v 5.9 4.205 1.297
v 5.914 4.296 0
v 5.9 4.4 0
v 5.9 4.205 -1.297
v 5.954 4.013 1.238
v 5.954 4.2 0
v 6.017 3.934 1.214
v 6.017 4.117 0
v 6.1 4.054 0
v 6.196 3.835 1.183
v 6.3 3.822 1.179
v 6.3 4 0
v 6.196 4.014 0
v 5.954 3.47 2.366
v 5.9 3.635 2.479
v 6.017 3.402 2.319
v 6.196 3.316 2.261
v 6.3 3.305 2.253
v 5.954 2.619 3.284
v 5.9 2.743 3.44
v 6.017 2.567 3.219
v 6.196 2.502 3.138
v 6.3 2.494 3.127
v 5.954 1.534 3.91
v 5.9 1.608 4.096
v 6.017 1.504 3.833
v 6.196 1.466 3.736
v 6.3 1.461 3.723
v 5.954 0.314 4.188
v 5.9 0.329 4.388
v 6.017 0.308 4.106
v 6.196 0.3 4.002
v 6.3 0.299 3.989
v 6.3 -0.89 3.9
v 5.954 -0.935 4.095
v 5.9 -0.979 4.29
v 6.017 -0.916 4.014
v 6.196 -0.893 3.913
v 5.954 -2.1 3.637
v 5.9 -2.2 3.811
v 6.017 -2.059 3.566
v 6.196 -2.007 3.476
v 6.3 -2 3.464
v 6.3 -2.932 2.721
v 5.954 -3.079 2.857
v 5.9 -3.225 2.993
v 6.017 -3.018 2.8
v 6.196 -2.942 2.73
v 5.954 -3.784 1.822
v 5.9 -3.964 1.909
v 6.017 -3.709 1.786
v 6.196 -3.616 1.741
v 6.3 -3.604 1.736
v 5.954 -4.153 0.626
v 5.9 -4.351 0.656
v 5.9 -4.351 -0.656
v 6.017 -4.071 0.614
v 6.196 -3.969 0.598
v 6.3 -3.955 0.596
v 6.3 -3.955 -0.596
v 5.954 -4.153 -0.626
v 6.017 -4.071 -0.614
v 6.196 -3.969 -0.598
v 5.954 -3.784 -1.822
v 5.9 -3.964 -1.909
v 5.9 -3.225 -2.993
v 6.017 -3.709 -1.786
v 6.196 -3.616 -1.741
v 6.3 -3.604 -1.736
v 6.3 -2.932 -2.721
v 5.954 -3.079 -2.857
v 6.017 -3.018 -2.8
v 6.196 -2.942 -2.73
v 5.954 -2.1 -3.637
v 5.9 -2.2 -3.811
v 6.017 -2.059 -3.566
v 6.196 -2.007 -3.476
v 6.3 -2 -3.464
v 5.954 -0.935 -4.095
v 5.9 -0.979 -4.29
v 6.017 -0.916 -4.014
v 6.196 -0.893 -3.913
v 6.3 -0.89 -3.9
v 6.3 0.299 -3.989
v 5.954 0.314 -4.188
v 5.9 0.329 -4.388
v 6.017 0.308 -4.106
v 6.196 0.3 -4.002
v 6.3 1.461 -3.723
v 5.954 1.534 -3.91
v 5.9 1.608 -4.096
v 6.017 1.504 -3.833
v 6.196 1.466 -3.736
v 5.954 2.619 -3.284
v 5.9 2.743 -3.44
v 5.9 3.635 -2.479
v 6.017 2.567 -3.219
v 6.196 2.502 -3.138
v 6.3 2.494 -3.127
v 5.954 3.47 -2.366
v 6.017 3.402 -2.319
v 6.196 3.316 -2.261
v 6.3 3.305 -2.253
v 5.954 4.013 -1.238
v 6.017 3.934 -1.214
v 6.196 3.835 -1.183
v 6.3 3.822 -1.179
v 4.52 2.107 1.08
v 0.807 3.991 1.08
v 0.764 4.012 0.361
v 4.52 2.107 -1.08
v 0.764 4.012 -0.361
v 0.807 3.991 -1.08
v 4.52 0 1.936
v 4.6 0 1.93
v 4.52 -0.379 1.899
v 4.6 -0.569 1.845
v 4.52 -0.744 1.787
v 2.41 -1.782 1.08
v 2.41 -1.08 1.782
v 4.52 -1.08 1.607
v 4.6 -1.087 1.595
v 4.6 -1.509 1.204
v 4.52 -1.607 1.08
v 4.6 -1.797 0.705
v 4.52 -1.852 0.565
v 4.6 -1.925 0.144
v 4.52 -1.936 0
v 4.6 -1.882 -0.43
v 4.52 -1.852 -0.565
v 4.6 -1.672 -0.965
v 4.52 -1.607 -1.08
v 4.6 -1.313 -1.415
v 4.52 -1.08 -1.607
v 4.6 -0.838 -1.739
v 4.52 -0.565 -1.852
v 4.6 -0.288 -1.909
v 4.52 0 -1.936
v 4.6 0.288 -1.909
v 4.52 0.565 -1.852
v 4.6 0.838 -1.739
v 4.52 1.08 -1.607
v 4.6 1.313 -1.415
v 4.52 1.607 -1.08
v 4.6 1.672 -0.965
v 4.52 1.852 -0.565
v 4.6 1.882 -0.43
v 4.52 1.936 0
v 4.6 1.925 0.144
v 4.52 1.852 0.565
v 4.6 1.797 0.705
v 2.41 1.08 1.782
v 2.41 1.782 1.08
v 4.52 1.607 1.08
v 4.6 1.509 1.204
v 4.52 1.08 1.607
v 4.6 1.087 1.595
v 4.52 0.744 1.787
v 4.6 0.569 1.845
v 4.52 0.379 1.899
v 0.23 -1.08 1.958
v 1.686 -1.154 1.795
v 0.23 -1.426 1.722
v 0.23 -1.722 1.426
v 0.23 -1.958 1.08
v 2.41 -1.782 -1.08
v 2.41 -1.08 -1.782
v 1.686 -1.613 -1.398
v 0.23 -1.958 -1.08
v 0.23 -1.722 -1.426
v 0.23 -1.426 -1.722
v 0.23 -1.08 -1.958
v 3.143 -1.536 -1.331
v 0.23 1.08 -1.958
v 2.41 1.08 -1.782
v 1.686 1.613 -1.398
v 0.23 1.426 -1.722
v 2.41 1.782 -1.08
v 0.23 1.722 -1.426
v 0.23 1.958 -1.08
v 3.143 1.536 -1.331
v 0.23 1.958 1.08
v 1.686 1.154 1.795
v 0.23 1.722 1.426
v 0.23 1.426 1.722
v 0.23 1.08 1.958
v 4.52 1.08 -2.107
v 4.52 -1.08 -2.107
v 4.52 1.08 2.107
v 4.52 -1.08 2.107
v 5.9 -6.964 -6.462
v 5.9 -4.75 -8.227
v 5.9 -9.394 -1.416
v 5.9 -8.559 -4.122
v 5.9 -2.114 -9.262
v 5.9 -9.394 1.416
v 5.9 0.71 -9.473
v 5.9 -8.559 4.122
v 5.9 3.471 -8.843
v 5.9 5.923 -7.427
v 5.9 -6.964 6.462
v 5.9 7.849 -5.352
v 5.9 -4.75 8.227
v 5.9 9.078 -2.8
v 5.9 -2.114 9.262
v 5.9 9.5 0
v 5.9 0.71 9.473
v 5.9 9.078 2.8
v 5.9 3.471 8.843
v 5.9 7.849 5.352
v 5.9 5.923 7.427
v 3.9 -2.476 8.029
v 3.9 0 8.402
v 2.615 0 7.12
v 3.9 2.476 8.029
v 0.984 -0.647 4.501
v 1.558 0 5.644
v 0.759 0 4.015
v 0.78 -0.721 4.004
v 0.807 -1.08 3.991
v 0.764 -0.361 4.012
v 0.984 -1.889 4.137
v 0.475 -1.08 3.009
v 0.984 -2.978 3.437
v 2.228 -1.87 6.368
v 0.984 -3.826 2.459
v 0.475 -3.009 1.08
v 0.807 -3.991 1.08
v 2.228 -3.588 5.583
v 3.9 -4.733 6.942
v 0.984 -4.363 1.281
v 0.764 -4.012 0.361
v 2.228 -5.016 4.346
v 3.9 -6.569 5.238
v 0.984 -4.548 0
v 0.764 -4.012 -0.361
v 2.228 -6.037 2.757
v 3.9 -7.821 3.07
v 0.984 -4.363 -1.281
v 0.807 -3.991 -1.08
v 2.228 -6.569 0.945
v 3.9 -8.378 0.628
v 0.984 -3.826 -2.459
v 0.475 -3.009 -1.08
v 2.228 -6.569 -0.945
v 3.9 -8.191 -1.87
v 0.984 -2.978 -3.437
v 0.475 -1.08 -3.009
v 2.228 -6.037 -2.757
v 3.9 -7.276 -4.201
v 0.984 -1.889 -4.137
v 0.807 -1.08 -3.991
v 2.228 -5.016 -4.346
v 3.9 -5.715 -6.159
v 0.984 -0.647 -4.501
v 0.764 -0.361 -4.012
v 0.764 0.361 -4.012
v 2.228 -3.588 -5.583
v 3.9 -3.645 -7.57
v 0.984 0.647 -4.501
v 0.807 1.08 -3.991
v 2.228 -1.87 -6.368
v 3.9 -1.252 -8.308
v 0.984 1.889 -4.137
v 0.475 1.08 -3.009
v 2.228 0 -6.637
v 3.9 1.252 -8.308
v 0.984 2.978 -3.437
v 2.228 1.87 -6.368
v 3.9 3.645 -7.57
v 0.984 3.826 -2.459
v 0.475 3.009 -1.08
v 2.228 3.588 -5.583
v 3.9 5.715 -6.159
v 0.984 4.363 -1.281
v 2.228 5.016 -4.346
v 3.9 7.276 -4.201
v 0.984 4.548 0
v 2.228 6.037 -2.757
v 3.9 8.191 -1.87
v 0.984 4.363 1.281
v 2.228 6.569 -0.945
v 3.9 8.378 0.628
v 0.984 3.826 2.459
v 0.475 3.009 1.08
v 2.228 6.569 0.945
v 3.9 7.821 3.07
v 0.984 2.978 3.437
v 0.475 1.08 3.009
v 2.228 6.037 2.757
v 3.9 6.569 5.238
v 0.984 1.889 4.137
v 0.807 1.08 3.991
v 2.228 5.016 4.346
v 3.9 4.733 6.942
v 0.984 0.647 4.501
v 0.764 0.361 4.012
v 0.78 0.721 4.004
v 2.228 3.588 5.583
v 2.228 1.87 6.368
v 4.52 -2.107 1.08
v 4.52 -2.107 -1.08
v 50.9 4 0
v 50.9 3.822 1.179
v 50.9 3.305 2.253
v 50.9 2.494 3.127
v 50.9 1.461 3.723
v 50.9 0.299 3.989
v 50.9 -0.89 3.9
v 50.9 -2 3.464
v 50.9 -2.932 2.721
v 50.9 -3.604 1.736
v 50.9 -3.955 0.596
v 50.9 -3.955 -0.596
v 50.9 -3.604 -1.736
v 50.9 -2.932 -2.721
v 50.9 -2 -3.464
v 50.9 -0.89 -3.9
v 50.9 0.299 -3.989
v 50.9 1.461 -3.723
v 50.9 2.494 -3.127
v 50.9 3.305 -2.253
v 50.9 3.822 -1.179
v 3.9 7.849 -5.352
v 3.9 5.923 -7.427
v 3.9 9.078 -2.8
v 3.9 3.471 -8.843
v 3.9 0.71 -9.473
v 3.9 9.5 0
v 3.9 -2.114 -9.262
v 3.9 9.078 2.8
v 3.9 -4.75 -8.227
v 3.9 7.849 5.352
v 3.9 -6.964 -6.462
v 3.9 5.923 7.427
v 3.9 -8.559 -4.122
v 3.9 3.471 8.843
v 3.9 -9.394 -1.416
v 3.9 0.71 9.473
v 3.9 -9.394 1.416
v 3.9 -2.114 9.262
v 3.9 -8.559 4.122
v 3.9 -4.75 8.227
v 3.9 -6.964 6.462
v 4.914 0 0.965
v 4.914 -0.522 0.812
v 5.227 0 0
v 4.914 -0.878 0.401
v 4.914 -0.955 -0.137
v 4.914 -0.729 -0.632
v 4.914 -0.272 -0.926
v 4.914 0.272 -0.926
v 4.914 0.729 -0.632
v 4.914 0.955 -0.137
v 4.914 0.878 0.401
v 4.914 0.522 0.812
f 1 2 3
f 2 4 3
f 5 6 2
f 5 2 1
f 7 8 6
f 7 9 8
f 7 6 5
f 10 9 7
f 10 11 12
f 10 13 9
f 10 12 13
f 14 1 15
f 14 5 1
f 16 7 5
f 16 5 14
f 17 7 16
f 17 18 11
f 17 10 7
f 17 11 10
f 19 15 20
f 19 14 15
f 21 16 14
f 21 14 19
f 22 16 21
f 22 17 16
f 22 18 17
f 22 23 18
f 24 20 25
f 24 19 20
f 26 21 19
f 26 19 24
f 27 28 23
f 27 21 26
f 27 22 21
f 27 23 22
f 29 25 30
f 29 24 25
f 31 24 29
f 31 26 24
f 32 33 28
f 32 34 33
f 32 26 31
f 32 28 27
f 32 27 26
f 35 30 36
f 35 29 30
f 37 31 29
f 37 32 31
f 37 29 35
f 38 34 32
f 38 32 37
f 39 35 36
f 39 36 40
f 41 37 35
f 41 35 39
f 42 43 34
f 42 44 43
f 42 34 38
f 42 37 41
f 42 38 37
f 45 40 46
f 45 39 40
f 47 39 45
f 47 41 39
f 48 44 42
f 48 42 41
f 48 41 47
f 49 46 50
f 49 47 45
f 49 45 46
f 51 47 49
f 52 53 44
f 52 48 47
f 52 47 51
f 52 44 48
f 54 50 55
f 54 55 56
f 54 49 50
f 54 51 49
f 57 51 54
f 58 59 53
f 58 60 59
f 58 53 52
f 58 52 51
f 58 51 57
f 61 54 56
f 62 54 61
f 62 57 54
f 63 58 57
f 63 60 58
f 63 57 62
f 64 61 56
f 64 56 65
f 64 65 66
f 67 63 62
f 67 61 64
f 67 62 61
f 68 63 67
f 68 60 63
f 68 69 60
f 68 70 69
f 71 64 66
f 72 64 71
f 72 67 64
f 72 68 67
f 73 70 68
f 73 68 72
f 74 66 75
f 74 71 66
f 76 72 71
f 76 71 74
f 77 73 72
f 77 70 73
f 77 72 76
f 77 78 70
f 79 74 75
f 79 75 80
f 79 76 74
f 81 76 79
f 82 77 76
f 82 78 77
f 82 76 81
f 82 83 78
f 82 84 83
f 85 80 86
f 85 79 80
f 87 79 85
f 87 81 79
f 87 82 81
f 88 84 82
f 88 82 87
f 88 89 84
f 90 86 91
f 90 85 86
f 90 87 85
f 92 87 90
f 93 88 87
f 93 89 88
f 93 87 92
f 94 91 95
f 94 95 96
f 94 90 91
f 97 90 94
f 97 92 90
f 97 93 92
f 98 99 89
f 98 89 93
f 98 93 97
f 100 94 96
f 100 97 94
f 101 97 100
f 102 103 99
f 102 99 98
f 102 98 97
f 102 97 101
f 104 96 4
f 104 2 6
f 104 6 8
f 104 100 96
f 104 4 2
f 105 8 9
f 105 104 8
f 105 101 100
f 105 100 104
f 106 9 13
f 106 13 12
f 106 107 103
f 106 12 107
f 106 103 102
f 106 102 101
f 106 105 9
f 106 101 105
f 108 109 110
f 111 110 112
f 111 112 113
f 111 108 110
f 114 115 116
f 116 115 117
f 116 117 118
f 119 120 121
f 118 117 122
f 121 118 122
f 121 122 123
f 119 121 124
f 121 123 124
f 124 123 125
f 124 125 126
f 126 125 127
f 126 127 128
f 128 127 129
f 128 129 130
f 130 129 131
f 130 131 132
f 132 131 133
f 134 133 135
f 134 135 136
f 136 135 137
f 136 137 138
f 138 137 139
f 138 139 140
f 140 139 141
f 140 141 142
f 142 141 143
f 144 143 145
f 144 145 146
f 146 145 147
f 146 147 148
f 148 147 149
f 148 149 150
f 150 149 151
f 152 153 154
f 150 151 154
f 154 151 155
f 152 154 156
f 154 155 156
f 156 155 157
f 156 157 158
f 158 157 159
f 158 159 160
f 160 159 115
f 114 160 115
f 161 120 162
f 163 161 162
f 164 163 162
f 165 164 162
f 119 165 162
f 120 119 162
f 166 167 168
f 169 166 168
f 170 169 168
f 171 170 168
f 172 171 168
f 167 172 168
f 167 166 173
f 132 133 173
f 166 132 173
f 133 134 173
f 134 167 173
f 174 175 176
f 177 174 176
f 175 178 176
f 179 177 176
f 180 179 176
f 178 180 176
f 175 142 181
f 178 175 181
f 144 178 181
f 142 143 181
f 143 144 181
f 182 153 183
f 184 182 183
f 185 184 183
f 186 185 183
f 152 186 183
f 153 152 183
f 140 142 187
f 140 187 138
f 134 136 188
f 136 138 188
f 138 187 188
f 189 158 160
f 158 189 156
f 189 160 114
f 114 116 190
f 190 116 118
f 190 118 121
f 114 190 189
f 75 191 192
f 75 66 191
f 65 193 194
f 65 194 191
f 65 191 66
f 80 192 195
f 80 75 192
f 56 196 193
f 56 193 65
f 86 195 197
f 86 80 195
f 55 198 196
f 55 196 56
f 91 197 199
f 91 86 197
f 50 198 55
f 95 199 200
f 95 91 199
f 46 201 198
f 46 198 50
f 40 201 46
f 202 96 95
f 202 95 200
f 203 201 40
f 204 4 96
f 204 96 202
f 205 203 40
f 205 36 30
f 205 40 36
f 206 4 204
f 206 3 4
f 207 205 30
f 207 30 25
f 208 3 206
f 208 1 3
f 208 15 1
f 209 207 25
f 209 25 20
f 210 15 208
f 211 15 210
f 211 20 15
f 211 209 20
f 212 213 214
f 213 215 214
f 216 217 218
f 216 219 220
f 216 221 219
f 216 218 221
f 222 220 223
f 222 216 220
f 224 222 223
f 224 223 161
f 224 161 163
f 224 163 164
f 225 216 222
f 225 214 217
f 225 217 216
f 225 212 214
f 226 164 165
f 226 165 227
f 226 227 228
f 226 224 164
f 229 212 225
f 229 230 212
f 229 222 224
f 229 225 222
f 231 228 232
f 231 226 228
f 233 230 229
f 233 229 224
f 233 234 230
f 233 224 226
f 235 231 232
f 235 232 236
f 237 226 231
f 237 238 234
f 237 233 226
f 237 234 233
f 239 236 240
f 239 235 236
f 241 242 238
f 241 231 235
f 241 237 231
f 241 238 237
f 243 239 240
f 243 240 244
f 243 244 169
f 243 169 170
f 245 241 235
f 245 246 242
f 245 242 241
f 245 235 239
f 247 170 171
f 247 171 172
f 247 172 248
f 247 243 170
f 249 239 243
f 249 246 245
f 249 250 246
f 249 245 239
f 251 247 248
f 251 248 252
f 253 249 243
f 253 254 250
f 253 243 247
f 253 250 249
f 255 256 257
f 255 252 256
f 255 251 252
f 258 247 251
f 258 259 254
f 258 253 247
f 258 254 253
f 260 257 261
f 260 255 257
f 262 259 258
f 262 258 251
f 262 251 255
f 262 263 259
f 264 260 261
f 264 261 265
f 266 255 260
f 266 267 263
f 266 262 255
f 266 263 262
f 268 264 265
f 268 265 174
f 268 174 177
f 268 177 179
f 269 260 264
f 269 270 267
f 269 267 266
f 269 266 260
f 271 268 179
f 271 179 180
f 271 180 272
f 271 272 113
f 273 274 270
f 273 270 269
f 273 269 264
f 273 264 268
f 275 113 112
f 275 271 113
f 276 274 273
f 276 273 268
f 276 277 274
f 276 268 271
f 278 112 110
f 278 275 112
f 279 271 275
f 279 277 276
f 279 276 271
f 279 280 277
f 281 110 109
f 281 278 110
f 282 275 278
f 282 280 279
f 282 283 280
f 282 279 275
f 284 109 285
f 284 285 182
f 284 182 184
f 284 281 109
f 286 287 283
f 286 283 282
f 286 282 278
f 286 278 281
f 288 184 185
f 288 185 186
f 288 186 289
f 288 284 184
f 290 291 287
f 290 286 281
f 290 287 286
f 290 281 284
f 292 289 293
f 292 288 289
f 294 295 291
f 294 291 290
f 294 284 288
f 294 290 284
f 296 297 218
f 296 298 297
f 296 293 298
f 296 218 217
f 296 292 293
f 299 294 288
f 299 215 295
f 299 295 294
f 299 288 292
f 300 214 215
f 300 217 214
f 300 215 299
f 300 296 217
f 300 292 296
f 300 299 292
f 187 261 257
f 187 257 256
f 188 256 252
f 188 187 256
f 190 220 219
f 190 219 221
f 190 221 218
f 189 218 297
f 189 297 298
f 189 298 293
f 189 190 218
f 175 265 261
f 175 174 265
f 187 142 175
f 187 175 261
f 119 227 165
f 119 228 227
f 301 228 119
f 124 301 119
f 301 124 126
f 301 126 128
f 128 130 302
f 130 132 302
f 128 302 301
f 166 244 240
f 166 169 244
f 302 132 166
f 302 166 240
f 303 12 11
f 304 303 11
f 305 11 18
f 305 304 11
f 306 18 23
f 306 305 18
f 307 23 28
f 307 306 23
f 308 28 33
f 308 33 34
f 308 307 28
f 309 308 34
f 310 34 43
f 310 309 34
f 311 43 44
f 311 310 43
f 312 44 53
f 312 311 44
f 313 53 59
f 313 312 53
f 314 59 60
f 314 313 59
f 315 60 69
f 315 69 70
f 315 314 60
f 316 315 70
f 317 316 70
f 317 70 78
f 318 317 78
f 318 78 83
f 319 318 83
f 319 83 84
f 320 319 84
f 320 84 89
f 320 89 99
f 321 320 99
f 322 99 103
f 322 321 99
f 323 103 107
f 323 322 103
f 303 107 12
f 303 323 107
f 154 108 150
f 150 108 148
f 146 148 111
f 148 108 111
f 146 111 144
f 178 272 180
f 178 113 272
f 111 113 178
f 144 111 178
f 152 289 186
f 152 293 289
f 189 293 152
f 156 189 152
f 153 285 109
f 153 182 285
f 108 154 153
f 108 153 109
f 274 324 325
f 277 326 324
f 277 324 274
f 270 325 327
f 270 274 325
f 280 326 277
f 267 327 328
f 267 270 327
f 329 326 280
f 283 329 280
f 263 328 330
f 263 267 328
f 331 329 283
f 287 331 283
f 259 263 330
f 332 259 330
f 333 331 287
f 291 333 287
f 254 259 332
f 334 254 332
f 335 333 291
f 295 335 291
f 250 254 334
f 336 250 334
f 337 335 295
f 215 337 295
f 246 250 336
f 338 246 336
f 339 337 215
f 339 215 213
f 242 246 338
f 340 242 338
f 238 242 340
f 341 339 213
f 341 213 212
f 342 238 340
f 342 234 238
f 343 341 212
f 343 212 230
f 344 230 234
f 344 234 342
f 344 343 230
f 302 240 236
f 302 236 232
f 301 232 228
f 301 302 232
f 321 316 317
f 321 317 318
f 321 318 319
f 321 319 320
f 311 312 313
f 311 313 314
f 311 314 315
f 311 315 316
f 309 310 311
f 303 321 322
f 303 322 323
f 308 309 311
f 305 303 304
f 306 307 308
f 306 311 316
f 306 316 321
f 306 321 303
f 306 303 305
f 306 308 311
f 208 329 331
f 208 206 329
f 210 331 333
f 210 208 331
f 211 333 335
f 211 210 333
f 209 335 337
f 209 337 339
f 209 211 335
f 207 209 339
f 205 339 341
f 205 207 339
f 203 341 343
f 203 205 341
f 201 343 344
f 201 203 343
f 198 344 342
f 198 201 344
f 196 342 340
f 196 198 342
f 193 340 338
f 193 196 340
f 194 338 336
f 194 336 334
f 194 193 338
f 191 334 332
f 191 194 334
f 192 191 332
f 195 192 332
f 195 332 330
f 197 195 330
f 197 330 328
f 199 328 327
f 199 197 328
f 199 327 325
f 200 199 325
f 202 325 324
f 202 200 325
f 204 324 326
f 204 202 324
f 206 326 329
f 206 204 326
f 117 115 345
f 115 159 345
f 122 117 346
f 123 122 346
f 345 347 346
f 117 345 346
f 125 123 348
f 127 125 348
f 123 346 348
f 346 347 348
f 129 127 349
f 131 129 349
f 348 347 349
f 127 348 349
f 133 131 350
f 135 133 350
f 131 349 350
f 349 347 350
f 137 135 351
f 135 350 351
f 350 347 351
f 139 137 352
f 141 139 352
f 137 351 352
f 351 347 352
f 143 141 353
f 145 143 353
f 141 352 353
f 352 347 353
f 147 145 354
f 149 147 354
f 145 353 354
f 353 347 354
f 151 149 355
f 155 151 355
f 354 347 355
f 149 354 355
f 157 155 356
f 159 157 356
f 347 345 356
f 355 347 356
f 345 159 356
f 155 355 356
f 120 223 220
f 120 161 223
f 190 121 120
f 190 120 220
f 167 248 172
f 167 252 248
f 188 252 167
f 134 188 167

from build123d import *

# Parameters (mm, degrees)
FILLET1_R    = 0.4
RECPAT_COUNT = 2
RECPAT_ANGLE = 90


with BuildPart() as part:
    # BodySke → Base-Revolve (revolve)
    with BuildSketch(Plane.XY):
        Polygon((5.9, 4), (5.9, 9.5), (3.9, 9.5), (3.9, 0), (50.9, 0), (50.9, 4), align=None)
    revolve(axis=Axis((-6.35, 0, 0), (1, 0, 0)))

    # Fillet1
    fillet1_edges = [part.edges().sort_by_distance(p)[0] for p in [
        (5.9, -4, 0),
    ]]
    fillet(fillet1_edges, radius=FILLET1_R)

    # PanSke → Pan (revolve)
    with BuildSketch(Plane.XY):
        with BuildLine():
            Line((3.9, 8.401785525), (3.9, 0))
            Line((3.9, 0), (0, 0))
            ThreePointArc((0, 0), (1.02252537, 4.631414471), (3.9, 8.401785525))
        make_face()
    revolve(axis=Axis((0, 0, 0), (1, 0, 0)))

    # Sketch3 → Recess section 0
    with BuildSketch(Plane(origin=(0, 0, 0), x_dir=(0, 0, -1), z_dir=(1, 0, 0))):
        with BuildLine():
            Line((-1.08, 4.4), (1.08, 4.4))
            Line((1.08, 4.4), (1.08, -4.4))
            Line((1.08, -4.4), (-1.08, -4.4))
            Line((-1.08, -4.4), (-1.08, 4.4))
        make_face()
    # Sketch4 → Recess section 1
    with BuildSketch(Plane(origin=(4.52, 0, 0), x_dir=(0, 0, -1), z_dir=(1, 0, 0))):
        with BuildLine():
            Line((-1.08, 2.106524682), (1.08, 2.106524682))
            Line((1.08, 2.106524682), (1.08, -2.106524682))
            Line((1.08, -2.106524682), (-1.08, -2.106524682))
            Line((-1.08, -2.106524682), (-1.08, 2.106524682))
        make_face()
    recess = loft(mode=Mode.SUBTRACT)

    # RecPat: Recess ×2 about axis
    recpat_axis = Axis((0, 0, 0), (1, 0, 0))
    for i in range(1, RECPAT_COUNT):
        add(recess.rotate(recpat_axis, i * RECPAT_ANGLE / (RECPAT_COUNT - 1)), mode=Mode.SUBTRACT)

    # RecCorSke → RecessCore (revolve, cut)
    with BuildSketch(Plane.XY):
        Polygon((0, 0), (0, 2.252163335), (4.6, 1.9305), (5.227257474, 0), align=None)
    revolve(axis=Axis((-3.175, 0, 0), (1, 0, 0)), mode=Mode.SUBTRACT)


solid = part.part
